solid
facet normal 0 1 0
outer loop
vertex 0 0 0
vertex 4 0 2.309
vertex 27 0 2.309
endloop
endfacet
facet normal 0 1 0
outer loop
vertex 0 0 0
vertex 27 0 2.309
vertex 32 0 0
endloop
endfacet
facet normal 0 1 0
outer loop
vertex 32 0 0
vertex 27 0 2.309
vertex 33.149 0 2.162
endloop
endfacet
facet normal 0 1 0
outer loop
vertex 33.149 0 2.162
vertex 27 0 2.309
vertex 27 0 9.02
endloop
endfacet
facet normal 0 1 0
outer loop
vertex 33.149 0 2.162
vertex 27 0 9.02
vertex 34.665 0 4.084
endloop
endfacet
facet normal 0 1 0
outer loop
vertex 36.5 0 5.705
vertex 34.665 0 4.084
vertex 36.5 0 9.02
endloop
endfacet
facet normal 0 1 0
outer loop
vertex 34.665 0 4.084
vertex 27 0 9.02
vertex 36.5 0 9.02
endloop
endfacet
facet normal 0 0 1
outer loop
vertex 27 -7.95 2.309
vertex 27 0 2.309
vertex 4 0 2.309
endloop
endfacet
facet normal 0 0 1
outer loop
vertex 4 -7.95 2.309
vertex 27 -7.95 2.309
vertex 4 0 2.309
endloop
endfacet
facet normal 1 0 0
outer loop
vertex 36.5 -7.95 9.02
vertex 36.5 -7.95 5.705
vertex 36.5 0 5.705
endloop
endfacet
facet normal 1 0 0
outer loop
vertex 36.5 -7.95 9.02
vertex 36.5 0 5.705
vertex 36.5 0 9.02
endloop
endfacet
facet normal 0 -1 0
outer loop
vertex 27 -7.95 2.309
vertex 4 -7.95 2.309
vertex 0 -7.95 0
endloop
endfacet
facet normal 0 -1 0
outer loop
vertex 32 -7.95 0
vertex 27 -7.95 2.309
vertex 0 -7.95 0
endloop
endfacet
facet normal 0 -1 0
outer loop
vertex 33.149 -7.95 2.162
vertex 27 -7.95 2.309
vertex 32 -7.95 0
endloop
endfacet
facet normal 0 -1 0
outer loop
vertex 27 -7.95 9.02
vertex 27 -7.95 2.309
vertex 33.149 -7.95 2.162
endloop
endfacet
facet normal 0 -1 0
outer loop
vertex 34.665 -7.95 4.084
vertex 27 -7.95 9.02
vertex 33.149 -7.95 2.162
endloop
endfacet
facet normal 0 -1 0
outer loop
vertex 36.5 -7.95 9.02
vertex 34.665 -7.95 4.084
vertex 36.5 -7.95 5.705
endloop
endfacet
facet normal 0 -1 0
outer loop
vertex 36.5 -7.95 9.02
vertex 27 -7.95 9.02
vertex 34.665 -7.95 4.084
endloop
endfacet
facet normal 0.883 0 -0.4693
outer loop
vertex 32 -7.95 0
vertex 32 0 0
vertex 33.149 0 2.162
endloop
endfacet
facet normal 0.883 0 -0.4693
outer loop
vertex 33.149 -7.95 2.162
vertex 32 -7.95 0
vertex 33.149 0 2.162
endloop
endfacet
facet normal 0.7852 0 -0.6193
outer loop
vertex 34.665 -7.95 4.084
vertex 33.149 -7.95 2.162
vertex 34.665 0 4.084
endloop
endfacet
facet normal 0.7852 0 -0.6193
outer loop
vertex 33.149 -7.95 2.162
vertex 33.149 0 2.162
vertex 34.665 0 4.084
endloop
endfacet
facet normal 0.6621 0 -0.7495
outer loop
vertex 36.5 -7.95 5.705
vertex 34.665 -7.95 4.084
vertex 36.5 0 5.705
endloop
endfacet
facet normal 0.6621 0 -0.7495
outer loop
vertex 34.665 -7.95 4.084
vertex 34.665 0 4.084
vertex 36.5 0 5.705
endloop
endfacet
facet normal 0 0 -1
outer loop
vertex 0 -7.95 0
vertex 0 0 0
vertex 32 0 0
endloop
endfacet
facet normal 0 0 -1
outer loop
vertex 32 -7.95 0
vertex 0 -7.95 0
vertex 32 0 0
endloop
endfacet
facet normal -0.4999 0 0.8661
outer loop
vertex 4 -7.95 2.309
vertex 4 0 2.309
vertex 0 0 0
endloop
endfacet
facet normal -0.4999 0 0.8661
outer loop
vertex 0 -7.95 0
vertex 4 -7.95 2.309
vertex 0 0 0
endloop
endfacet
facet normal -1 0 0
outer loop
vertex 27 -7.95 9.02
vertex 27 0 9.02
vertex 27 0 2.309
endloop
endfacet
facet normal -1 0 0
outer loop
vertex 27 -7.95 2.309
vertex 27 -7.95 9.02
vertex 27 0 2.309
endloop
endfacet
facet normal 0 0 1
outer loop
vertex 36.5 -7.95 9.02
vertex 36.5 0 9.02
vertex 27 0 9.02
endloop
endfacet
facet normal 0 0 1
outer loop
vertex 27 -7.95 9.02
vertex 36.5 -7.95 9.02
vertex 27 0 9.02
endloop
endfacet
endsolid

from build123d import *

# Parameters (mm, degrees)
F1_DEPTH = 7.95


with BuildPart() as f1:
    # F0 (on Front) → F1 (new body)
    with BuildSketch(Plane.XZ):
        with BuildLine():
            Line((4, 2.309401), (0, 0))
            Line((0, 0), (25.413539, 0))
            Line((25.413539, 0), (32, 0))
            ThreePointArc((32, 0), (33.863776, 3.157224), (36.5, 5.705172))
            Line((36.5, 5.705172), (36.5, 9.02))
            Line((36.5, 9.02), (27, 9.02))
            Line((27, 9.02), (27, 4.098076))
            Line((27, 4.098076), (27, 2.309401))
            Line((27, 2.309401), (4, 2.309401))
        make_face()
    extrude(amount=F1_DEPTH)


solid = f1.part
